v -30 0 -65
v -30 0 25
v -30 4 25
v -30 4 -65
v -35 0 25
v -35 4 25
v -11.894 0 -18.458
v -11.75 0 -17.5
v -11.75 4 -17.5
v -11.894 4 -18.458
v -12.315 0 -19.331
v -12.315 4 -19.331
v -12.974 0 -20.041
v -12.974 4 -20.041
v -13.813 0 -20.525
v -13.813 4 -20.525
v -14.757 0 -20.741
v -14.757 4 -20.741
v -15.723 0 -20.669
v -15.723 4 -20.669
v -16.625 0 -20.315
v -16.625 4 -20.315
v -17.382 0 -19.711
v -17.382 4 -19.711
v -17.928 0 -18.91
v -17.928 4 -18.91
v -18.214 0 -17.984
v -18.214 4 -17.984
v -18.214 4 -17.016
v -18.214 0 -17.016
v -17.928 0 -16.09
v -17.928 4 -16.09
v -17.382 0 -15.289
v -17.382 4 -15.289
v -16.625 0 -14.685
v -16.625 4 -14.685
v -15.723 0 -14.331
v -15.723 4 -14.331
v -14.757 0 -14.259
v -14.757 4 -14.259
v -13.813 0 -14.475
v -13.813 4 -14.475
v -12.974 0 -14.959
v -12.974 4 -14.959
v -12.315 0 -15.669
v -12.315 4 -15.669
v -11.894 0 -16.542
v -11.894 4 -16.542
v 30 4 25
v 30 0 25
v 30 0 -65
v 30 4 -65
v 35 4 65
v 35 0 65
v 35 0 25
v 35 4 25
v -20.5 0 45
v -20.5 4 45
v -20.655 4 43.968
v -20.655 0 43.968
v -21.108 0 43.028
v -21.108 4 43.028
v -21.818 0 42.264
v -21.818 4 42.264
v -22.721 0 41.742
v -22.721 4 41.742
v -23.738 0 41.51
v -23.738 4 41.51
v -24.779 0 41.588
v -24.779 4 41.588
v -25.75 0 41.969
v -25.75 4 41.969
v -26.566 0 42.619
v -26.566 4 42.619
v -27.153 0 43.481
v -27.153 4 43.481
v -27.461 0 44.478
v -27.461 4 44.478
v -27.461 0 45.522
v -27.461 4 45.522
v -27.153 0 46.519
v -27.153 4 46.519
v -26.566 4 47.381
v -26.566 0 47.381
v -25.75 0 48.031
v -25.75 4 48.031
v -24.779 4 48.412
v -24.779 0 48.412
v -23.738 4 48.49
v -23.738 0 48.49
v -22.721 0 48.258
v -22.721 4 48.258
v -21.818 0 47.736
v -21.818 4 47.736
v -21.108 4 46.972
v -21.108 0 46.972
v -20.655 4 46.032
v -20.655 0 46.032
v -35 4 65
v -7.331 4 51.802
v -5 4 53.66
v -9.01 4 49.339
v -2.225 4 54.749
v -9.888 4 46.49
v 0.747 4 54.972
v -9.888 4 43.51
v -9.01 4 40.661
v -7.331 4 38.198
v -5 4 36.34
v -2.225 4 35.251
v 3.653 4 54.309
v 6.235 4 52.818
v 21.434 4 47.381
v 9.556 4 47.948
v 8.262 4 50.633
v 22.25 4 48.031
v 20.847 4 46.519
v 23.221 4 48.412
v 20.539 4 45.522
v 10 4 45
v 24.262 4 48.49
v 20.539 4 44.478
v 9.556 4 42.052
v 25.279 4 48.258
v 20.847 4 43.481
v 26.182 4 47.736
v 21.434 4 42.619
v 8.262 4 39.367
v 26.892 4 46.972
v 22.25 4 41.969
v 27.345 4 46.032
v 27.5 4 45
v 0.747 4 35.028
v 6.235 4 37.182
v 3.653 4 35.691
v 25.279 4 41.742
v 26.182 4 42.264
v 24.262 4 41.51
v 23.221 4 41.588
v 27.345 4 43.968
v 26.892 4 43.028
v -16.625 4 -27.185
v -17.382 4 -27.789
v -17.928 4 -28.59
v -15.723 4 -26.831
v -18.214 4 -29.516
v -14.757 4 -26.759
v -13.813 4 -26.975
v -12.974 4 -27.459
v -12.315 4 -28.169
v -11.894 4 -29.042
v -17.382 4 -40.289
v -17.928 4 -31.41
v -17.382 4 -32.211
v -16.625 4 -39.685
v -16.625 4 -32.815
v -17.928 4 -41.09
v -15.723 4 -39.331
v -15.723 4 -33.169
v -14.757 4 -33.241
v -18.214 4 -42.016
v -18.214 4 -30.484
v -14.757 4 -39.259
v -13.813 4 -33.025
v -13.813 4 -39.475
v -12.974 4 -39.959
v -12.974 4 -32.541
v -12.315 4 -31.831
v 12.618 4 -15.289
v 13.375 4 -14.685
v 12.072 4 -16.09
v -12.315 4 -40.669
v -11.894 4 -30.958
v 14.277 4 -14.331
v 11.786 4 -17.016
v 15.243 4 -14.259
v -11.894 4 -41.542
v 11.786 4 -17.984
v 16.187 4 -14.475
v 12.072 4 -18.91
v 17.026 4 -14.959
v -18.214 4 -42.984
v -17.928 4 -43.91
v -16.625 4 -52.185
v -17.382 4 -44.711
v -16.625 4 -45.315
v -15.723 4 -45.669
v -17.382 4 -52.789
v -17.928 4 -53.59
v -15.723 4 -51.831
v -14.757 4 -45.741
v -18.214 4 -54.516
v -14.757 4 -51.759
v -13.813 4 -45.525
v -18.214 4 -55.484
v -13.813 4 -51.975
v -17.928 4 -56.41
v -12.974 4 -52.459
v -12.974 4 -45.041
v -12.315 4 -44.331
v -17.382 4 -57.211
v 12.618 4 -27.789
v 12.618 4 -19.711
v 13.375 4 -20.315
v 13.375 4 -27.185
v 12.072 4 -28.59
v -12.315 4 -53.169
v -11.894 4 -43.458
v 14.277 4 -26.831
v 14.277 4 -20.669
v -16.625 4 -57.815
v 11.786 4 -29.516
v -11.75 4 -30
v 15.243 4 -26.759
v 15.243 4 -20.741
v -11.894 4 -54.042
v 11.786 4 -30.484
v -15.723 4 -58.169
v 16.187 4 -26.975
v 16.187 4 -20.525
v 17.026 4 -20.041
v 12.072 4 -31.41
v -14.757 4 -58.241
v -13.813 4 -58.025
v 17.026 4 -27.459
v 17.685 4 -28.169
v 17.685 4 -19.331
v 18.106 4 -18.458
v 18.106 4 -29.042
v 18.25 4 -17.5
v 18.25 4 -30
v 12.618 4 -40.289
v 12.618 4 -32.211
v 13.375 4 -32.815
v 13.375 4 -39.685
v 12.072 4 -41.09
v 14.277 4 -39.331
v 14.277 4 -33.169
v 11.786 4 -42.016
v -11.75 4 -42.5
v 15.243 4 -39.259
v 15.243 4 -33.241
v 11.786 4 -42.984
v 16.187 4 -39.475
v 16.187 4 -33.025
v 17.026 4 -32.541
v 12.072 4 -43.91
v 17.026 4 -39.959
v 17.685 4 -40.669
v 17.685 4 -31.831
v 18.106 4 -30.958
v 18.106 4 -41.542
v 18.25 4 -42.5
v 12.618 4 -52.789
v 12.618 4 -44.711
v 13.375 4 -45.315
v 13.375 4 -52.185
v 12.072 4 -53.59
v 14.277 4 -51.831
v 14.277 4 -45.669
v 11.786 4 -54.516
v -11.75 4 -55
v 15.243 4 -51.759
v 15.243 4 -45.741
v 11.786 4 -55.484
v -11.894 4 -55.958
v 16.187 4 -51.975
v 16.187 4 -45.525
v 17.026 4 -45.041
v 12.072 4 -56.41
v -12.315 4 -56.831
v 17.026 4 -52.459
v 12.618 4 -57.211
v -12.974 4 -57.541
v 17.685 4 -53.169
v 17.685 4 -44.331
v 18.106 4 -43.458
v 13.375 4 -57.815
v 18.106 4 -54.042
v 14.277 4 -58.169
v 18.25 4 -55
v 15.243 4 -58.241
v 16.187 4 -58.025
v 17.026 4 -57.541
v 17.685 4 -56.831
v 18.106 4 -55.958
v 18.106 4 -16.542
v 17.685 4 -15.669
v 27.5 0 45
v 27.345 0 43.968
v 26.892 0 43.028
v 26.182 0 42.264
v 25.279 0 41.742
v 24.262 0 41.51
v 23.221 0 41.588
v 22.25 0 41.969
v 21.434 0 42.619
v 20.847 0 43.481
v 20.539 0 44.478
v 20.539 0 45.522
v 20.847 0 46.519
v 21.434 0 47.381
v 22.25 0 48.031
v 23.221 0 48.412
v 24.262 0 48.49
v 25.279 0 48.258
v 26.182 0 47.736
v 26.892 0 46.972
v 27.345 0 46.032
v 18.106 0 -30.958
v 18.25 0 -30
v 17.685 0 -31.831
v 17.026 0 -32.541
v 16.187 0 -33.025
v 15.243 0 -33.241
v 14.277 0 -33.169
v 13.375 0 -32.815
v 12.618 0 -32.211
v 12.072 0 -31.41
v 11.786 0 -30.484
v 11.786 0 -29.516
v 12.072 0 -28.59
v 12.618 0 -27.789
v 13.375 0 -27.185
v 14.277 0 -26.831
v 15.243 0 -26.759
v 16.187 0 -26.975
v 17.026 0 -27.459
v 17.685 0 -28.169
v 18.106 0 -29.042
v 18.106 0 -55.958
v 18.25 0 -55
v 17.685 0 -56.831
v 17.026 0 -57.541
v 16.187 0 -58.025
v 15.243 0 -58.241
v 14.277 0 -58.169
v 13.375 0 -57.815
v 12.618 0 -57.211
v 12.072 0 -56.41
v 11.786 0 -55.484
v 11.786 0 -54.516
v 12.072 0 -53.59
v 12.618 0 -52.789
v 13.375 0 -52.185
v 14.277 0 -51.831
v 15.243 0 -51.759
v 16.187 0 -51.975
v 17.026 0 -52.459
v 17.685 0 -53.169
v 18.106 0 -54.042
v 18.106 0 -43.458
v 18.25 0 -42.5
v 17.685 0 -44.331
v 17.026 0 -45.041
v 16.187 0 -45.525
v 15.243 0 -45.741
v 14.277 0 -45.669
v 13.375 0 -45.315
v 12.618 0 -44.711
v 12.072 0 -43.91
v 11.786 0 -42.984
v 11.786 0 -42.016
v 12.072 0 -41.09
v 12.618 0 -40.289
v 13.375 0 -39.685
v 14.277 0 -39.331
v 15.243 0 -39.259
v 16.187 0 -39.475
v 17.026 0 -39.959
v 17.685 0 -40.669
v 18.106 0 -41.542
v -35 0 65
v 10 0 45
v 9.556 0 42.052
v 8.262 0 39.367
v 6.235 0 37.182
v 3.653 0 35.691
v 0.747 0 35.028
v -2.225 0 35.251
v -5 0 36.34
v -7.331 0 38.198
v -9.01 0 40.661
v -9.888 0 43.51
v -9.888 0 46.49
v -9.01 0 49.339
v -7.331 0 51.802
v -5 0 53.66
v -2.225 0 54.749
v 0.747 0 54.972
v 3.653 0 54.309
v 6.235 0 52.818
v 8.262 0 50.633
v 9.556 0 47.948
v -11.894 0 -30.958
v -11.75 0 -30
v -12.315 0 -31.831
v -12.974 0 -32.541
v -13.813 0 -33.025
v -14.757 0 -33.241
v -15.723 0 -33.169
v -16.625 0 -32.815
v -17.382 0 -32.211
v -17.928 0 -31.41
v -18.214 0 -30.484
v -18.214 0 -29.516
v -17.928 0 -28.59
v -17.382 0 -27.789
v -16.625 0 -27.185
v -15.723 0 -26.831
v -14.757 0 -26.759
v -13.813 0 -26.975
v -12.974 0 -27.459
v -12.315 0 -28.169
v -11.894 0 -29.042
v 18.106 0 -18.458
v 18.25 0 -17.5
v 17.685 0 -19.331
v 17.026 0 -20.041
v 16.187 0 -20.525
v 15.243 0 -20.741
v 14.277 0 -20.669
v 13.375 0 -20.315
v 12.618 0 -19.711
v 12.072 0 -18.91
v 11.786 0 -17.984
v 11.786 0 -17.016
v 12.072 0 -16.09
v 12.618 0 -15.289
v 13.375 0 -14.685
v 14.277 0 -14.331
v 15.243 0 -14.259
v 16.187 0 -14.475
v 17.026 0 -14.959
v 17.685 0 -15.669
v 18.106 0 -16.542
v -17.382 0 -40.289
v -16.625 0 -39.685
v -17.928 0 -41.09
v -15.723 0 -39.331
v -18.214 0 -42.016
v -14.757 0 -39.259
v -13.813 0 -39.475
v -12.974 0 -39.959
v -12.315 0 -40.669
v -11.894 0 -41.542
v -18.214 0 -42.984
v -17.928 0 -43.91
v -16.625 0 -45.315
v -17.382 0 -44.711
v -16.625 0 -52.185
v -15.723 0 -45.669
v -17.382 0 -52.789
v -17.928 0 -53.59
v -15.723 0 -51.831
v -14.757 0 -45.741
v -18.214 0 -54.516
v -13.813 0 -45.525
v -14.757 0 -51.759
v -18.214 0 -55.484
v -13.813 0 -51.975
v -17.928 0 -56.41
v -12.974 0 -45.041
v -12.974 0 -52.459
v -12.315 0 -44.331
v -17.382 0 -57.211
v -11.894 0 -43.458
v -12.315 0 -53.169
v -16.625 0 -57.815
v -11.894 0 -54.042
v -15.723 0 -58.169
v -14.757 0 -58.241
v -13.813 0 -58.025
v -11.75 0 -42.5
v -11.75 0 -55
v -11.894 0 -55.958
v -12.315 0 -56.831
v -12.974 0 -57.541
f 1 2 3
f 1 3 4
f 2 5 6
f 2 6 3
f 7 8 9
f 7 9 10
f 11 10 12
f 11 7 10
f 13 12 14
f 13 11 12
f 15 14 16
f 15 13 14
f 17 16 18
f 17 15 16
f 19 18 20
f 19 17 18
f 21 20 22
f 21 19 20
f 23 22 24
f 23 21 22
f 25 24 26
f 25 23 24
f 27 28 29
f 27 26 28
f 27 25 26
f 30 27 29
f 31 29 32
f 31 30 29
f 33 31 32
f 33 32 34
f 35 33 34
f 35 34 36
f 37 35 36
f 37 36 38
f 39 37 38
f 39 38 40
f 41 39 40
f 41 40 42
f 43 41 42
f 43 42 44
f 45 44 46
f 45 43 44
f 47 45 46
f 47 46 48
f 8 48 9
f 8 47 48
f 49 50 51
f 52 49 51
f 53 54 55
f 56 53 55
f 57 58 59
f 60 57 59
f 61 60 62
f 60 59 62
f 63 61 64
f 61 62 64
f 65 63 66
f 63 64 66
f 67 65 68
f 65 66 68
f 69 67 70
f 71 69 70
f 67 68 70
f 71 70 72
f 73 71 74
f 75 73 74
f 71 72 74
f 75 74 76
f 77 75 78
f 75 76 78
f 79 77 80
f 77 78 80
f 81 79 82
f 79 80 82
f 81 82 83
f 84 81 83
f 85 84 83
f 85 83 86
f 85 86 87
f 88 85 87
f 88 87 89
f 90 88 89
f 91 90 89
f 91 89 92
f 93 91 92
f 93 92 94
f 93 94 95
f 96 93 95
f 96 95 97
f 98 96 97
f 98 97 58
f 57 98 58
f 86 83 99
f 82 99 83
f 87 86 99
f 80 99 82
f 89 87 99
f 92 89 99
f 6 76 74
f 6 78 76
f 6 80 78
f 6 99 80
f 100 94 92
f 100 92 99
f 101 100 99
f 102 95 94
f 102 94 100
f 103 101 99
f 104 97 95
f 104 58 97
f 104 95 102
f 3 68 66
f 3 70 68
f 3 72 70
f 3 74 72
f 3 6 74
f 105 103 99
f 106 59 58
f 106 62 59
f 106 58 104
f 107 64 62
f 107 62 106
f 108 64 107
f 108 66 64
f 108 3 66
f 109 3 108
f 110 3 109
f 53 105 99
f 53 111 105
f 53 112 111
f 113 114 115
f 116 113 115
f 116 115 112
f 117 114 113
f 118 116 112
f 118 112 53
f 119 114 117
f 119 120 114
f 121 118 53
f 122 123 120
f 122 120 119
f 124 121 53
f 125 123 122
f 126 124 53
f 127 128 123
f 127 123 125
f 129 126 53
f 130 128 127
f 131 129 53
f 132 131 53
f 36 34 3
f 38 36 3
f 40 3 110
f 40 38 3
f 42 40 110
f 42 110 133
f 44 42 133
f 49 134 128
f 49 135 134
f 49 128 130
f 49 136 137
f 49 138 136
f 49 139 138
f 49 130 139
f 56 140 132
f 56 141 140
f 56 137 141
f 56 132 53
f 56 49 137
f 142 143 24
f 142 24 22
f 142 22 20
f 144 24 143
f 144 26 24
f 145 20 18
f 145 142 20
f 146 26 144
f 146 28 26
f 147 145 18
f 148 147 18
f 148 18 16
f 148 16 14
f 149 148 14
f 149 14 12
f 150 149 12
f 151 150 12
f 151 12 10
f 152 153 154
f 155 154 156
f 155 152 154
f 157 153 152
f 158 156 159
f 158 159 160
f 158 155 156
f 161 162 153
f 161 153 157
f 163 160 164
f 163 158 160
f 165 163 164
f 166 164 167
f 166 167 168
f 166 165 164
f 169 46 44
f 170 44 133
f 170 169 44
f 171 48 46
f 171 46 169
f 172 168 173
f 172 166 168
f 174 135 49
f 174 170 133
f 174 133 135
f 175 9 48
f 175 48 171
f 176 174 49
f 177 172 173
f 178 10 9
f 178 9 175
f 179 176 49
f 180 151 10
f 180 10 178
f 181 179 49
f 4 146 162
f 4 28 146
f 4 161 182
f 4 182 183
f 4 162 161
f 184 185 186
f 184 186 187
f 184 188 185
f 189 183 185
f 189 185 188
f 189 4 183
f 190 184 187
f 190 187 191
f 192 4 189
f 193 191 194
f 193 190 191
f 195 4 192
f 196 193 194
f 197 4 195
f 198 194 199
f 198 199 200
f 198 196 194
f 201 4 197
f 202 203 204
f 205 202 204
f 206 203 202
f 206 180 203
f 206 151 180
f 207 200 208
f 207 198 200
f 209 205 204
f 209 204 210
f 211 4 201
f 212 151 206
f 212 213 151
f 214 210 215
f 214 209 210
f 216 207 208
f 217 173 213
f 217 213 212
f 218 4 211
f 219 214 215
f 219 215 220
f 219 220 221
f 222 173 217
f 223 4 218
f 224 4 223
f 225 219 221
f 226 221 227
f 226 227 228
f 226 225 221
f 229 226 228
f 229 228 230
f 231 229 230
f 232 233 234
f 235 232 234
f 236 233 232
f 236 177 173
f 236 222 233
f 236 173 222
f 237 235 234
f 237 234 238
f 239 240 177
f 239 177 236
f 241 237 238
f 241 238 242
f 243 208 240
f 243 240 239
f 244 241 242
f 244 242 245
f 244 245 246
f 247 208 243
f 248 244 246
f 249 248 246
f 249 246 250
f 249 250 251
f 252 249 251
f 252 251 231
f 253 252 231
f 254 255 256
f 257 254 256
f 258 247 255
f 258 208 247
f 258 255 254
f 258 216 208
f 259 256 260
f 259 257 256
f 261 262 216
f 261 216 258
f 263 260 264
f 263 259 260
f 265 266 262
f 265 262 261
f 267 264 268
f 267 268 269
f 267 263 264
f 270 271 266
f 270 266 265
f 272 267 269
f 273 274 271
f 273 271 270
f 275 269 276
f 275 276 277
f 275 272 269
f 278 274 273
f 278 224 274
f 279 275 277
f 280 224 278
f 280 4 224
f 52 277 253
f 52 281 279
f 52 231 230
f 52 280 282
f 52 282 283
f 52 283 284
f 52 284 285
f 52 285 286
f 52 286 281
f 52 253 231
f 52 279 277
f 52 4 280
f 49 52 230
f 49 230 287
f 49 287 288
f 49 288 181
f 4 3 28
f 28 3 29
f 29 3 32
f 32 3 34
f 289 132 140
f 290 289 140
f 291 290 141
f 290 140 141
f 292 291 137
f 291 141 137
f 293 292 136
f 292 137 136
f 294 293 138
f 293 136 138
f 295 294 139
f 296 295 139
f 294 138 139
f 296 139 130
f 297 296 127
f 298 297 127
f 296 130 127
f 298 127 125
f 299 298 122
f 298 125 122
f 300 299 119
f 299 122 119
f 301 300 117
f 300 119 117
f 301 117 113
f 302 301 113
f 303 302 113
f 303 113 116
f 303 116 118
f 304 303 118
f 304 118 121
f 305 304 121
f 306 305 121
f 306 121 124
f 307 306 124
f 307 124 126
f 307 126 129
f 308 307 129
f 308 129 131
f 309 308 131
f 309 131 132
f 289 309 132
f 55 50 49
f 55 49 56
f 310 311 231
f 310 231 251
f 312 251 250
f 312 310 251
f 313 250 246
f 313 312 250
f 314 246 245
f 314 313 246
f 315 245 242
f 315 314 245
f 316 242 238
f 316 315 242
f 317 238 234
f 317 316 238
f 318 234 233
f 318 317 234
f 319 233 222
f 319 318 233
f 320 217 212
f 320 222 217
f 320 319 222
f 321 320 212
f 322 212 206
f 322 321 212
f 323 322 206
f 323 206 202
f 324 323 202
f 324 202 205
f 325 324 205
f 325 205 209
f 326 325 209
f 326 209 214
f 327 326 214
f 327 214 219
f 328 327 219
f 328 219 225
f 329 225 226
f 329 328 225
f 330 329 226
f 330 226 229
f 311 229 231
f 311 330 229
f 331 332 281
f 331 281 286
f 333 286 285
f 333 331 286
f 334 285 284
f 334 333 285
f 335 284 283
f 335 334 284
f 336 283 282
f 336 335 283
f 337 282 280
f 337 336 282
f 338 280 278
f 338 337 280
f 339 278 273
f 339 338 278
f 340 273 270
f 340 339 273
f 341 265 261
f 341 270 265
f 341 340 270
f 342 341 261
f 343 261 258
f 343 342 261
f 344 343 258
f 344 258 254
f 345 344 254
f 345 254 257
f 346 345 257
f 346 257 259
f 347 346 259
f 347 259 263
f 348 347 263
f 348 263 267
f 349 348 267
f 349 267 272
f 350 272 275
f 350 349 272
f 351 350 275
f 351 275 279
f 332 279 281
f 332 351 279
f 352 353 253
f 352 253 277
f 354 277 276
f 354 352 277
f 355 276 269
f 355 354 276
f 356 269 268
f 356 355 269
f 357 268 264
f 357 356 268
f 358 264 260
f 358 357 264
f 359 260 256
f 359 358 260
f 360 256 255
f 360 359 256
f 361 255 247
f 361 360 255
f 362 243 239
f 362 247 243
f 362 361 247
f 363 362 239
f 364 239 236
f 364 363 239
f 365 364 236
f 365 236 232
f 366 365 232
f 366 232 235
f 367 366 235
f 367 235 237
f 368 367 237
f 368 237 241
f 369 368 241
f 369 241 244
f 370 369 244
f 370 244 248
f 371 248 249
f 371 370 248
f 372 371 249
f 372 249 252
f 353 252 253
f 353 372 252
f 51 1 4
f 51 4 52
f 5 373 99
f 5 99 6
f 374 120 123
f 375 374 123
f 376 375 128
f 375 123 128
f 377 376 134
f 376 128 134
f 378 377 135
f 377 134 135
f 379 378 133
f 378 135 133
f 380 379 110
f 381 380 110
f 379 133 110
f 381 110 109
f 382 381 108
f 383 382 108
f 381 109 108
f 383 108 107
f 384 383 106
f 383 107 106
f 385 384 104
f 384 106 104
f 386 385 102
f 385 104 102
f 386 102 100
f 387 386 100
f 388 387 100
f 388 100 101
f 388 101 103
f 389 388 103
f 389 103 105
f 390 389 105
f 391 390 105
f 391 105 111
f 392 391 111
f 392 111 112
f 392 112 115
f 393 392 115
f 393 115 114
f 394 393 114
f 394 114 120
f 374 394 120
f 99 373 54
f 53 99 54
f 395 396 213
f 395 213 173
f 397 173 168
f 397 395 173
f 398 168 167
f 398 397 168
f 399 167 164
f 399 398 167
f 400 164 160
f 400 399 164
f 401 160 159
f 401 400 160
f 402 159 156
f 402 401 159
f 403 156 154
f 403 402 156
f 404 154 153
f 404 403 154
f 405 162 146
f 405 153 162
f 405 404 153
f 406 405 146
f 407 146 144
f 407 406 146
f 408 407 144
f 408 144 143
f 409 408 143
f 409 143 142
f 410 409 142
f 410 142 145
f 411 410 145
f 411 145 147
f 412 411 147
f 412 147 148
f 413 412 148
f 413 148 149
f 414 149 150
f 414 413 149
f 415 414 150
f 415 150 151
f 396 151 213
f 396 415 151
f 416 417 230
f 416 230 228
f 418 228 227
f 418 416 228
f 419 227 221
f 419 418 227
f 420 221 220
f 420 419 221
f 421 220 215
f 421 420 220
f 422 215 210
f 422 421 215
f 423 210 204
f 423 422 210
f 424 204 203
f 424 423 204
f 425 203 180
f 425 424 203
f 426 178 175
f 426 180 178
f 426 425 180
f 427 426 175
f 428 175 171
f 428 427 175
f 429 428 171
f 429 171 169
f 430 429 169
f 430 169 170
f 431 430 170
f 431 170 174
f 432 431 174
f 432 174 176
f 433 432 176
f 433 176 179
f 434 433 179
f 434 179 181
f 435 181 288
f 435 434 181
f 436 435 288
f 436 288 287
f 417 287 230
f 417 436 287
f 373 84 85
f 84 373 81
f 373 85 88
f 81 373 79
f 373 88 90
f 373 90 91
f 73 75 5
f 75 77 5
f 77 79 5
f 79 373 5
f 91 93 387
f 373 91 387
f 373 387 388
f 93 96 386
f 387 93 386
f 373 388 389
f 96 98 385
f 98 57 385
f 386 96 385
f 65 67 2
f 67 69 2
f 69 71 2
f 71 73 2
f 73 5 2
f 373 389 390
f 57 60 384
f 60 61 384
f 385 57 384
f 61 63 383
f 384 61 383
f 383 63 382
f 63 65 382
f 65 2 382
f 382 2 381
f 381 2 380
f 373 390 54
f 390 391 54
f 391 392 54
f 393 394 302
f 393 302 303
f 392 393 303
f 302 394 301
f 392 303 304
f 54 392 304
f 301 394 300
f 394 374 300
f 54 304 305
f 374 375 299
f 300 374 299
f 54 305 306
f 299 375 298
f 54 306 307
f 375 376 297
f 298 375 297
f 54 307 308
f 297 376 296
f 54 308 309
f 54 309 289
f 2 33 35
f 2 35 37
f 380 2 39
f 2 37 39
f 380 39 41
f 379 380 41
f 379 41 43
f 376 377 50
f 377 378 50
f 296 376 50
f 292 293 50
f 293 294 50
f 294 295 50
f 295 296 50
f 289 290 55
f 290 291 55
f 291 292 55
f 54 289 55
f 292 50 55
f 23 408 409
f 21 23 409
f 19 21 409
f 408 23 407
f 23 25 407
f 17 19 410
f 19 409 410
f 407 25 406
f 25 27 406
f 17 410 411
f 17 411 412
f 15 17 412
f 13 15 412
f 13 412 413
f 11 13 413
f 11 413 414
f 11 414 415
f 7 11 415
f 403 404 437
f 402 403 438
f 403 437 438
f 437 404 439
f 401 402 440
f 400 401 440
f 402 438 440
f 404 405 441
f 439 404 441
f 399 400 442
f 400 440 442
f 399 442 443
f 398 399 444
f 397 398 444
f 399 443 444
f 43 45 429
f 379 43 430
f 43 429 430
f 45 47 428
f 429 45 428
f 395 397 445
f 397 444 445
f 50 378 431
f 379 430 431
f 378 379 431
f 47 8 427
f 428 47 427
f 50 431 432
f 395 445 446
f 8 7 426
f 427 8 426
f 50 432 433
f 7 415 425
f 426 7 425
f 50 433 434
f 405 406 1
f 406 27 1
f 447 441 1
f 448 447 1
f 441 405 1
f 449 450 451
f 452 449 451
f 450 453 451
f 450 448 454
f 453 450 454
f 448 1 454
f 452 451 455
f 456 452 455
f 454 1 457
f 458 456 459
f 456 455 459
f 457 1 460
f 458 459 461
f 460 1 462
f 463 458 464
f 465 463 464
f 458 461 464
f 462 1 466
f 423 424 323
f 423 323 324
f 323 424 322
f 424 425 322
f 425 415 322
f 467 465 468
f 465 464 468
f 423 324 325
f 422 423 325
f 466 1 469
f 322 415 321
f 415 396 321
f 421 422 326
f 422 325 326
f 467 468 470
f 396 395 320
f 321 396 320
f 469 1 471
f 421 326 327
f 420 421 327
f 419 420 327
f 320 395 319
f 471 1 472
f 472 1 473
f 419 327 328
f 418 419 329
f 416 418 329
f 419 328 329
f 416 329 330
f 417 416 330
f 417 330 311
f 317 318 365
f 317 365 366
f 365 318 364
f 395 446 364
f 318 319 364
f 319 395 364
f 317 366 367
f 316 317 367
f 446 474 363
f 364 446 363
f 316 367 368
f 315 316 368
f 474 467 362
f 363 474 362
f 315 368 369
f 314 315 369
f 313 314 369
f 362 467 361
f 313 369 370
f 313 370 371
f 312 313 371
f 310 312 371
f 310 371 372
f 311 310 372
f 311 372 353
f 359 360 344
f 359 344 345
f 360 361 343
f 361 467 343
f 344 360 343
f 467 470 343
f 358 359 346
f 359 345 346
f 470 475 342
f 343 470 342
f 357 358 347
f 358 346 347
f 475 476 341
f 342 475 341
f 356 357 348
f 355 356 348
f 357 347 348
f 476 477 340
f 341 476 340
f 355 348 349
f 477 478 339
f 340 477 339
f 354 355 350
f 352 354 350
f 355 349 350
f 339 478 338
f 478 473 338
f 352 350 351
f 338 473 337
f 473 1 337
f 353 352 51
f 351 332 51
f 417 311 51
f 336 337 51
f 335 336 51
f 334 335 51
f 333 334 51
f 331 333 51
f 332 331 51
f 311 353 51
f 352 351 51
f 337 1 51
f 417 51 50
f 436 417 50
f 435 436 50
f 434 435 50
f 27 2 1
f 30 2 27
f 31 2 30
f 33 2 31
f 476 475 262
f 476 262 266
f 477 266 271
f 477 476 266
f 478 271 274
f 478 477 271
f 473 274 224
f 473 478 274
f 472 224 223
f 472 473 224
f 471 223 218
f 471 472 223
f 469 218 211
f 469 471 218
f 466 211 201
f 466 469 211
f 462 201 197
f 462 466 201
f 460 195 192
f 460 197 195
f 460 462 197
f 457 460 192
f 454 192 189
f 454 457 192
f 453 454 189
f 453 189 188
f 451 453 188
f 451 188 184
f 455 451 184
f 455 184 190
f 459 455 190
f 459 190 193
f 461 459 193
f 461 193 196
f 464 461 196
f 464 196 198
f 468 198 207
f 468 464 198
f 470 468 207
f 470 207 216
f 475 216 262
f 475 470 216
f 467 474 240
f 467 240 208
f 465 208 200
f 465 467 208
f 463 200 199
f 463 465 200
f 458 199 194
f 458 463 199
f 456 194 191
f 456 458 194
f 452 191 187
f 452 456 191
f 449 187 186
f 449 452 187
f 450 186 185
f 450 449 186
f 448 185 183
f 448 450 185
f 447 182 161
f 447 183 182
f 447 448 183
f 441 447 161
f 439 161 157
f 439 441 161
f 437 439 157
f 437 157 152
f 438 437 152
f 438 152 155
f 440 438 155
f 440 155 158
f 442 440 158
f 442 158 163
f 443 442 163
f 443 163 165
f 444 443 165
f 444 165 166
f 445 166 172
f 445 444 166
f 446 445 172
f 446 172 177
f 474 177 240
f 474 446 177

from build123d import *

# Parameters (mm, degrees)
SKETCH1_W           = 60
SKETCH1_H           = 130
BOSS_EXTRUDE1_DEPTH = 4
SKETCH2_W           = 70
SKETCH2_H           = 40
BOSS_EXTRUDE2_DEPTH = 4
SKETCH3_R           = 3.5
SKETCH3_R_2         = 10
CUT_EXTRUDE1_DEPTH  = 5
CUT_EXTRUDE2_START  = -5
SKETCH4_R           = 3.25
CUT_EXTRUDE2_DEPTH  = 6
LPATTERN1_COUNT     = 4
LPATTERN1_PITCH     = 12.5


with BuildPart() as part:
    # Sketch1 → Boss-Extrude1 (new body)
    with BuildSketch(Plane(origin=(0, 0, 0), x_dir=(1, 0, 0), z_dir=(0, 1, 0))):
        Rectangle(SKETCH1_W, SKETCH1_H)
    extrude(amount=BOSS_EXTRUDE1_DEPTH)

    # Sketch2 → Boss-Extrude2 (add)
    with BuildSketch(Plane(origin=(0, 0, 0), x_dir=(1, 0, 0), z_dir=(0, 1, 0))):
        with Locations((0, -45)):
            Rectangle(SKETCH2_W, SKETCH2_H)
    extrude(amount=BOSS_EXTRUDE2_DEPTH)

    # Sketch3 → Cut-Extrude1 (cut, through all)
    with BuildSketch(Plane(origin=(0, 4, 0), x_dir=(1, 0, 0), z_dir=(0, 1, 0))):
        with Locations((24, -45)):
            Circle(SKETCH3_R)
        with Locations((-24, -45)):
            Circle(SKETCH3_R)
        with Locations((0, -45)):
            Circle(SKETCH3_R_2)
    extrude(amount=-CUT_EXTRUDE1_DEPTH, mode=Mode.SUBTRACT)

    # Sketch4 → Cut-Extrude2 (cut)
    with BuildSketch(Plane(origin=(0, 4, 0), x_dir=(1, 0, 0), z_dir=(0, 1, 0)).offset(CUT_EXTRUDE2_START)):
        with Locations((15, 55)):
            Circle(SKETCH4_R)
        with Locations((-15, 55)):
            Circle(SKETCH4_R)
    cut_extrude2 = extrude(amount=CUT_EXTRUDE2_DEPTH, mode=Mode.SUBTRACT)

    # LPattern1: Cut-Extrude2 ×4
    with Locations(*[(0, 0, i * LPATTERN1_PITCH) for i in range(1, LPATTERN1_COUNT)]):
        add(cut_extrude2, mode=Mode.SUBTRACT)


solid = part.part
